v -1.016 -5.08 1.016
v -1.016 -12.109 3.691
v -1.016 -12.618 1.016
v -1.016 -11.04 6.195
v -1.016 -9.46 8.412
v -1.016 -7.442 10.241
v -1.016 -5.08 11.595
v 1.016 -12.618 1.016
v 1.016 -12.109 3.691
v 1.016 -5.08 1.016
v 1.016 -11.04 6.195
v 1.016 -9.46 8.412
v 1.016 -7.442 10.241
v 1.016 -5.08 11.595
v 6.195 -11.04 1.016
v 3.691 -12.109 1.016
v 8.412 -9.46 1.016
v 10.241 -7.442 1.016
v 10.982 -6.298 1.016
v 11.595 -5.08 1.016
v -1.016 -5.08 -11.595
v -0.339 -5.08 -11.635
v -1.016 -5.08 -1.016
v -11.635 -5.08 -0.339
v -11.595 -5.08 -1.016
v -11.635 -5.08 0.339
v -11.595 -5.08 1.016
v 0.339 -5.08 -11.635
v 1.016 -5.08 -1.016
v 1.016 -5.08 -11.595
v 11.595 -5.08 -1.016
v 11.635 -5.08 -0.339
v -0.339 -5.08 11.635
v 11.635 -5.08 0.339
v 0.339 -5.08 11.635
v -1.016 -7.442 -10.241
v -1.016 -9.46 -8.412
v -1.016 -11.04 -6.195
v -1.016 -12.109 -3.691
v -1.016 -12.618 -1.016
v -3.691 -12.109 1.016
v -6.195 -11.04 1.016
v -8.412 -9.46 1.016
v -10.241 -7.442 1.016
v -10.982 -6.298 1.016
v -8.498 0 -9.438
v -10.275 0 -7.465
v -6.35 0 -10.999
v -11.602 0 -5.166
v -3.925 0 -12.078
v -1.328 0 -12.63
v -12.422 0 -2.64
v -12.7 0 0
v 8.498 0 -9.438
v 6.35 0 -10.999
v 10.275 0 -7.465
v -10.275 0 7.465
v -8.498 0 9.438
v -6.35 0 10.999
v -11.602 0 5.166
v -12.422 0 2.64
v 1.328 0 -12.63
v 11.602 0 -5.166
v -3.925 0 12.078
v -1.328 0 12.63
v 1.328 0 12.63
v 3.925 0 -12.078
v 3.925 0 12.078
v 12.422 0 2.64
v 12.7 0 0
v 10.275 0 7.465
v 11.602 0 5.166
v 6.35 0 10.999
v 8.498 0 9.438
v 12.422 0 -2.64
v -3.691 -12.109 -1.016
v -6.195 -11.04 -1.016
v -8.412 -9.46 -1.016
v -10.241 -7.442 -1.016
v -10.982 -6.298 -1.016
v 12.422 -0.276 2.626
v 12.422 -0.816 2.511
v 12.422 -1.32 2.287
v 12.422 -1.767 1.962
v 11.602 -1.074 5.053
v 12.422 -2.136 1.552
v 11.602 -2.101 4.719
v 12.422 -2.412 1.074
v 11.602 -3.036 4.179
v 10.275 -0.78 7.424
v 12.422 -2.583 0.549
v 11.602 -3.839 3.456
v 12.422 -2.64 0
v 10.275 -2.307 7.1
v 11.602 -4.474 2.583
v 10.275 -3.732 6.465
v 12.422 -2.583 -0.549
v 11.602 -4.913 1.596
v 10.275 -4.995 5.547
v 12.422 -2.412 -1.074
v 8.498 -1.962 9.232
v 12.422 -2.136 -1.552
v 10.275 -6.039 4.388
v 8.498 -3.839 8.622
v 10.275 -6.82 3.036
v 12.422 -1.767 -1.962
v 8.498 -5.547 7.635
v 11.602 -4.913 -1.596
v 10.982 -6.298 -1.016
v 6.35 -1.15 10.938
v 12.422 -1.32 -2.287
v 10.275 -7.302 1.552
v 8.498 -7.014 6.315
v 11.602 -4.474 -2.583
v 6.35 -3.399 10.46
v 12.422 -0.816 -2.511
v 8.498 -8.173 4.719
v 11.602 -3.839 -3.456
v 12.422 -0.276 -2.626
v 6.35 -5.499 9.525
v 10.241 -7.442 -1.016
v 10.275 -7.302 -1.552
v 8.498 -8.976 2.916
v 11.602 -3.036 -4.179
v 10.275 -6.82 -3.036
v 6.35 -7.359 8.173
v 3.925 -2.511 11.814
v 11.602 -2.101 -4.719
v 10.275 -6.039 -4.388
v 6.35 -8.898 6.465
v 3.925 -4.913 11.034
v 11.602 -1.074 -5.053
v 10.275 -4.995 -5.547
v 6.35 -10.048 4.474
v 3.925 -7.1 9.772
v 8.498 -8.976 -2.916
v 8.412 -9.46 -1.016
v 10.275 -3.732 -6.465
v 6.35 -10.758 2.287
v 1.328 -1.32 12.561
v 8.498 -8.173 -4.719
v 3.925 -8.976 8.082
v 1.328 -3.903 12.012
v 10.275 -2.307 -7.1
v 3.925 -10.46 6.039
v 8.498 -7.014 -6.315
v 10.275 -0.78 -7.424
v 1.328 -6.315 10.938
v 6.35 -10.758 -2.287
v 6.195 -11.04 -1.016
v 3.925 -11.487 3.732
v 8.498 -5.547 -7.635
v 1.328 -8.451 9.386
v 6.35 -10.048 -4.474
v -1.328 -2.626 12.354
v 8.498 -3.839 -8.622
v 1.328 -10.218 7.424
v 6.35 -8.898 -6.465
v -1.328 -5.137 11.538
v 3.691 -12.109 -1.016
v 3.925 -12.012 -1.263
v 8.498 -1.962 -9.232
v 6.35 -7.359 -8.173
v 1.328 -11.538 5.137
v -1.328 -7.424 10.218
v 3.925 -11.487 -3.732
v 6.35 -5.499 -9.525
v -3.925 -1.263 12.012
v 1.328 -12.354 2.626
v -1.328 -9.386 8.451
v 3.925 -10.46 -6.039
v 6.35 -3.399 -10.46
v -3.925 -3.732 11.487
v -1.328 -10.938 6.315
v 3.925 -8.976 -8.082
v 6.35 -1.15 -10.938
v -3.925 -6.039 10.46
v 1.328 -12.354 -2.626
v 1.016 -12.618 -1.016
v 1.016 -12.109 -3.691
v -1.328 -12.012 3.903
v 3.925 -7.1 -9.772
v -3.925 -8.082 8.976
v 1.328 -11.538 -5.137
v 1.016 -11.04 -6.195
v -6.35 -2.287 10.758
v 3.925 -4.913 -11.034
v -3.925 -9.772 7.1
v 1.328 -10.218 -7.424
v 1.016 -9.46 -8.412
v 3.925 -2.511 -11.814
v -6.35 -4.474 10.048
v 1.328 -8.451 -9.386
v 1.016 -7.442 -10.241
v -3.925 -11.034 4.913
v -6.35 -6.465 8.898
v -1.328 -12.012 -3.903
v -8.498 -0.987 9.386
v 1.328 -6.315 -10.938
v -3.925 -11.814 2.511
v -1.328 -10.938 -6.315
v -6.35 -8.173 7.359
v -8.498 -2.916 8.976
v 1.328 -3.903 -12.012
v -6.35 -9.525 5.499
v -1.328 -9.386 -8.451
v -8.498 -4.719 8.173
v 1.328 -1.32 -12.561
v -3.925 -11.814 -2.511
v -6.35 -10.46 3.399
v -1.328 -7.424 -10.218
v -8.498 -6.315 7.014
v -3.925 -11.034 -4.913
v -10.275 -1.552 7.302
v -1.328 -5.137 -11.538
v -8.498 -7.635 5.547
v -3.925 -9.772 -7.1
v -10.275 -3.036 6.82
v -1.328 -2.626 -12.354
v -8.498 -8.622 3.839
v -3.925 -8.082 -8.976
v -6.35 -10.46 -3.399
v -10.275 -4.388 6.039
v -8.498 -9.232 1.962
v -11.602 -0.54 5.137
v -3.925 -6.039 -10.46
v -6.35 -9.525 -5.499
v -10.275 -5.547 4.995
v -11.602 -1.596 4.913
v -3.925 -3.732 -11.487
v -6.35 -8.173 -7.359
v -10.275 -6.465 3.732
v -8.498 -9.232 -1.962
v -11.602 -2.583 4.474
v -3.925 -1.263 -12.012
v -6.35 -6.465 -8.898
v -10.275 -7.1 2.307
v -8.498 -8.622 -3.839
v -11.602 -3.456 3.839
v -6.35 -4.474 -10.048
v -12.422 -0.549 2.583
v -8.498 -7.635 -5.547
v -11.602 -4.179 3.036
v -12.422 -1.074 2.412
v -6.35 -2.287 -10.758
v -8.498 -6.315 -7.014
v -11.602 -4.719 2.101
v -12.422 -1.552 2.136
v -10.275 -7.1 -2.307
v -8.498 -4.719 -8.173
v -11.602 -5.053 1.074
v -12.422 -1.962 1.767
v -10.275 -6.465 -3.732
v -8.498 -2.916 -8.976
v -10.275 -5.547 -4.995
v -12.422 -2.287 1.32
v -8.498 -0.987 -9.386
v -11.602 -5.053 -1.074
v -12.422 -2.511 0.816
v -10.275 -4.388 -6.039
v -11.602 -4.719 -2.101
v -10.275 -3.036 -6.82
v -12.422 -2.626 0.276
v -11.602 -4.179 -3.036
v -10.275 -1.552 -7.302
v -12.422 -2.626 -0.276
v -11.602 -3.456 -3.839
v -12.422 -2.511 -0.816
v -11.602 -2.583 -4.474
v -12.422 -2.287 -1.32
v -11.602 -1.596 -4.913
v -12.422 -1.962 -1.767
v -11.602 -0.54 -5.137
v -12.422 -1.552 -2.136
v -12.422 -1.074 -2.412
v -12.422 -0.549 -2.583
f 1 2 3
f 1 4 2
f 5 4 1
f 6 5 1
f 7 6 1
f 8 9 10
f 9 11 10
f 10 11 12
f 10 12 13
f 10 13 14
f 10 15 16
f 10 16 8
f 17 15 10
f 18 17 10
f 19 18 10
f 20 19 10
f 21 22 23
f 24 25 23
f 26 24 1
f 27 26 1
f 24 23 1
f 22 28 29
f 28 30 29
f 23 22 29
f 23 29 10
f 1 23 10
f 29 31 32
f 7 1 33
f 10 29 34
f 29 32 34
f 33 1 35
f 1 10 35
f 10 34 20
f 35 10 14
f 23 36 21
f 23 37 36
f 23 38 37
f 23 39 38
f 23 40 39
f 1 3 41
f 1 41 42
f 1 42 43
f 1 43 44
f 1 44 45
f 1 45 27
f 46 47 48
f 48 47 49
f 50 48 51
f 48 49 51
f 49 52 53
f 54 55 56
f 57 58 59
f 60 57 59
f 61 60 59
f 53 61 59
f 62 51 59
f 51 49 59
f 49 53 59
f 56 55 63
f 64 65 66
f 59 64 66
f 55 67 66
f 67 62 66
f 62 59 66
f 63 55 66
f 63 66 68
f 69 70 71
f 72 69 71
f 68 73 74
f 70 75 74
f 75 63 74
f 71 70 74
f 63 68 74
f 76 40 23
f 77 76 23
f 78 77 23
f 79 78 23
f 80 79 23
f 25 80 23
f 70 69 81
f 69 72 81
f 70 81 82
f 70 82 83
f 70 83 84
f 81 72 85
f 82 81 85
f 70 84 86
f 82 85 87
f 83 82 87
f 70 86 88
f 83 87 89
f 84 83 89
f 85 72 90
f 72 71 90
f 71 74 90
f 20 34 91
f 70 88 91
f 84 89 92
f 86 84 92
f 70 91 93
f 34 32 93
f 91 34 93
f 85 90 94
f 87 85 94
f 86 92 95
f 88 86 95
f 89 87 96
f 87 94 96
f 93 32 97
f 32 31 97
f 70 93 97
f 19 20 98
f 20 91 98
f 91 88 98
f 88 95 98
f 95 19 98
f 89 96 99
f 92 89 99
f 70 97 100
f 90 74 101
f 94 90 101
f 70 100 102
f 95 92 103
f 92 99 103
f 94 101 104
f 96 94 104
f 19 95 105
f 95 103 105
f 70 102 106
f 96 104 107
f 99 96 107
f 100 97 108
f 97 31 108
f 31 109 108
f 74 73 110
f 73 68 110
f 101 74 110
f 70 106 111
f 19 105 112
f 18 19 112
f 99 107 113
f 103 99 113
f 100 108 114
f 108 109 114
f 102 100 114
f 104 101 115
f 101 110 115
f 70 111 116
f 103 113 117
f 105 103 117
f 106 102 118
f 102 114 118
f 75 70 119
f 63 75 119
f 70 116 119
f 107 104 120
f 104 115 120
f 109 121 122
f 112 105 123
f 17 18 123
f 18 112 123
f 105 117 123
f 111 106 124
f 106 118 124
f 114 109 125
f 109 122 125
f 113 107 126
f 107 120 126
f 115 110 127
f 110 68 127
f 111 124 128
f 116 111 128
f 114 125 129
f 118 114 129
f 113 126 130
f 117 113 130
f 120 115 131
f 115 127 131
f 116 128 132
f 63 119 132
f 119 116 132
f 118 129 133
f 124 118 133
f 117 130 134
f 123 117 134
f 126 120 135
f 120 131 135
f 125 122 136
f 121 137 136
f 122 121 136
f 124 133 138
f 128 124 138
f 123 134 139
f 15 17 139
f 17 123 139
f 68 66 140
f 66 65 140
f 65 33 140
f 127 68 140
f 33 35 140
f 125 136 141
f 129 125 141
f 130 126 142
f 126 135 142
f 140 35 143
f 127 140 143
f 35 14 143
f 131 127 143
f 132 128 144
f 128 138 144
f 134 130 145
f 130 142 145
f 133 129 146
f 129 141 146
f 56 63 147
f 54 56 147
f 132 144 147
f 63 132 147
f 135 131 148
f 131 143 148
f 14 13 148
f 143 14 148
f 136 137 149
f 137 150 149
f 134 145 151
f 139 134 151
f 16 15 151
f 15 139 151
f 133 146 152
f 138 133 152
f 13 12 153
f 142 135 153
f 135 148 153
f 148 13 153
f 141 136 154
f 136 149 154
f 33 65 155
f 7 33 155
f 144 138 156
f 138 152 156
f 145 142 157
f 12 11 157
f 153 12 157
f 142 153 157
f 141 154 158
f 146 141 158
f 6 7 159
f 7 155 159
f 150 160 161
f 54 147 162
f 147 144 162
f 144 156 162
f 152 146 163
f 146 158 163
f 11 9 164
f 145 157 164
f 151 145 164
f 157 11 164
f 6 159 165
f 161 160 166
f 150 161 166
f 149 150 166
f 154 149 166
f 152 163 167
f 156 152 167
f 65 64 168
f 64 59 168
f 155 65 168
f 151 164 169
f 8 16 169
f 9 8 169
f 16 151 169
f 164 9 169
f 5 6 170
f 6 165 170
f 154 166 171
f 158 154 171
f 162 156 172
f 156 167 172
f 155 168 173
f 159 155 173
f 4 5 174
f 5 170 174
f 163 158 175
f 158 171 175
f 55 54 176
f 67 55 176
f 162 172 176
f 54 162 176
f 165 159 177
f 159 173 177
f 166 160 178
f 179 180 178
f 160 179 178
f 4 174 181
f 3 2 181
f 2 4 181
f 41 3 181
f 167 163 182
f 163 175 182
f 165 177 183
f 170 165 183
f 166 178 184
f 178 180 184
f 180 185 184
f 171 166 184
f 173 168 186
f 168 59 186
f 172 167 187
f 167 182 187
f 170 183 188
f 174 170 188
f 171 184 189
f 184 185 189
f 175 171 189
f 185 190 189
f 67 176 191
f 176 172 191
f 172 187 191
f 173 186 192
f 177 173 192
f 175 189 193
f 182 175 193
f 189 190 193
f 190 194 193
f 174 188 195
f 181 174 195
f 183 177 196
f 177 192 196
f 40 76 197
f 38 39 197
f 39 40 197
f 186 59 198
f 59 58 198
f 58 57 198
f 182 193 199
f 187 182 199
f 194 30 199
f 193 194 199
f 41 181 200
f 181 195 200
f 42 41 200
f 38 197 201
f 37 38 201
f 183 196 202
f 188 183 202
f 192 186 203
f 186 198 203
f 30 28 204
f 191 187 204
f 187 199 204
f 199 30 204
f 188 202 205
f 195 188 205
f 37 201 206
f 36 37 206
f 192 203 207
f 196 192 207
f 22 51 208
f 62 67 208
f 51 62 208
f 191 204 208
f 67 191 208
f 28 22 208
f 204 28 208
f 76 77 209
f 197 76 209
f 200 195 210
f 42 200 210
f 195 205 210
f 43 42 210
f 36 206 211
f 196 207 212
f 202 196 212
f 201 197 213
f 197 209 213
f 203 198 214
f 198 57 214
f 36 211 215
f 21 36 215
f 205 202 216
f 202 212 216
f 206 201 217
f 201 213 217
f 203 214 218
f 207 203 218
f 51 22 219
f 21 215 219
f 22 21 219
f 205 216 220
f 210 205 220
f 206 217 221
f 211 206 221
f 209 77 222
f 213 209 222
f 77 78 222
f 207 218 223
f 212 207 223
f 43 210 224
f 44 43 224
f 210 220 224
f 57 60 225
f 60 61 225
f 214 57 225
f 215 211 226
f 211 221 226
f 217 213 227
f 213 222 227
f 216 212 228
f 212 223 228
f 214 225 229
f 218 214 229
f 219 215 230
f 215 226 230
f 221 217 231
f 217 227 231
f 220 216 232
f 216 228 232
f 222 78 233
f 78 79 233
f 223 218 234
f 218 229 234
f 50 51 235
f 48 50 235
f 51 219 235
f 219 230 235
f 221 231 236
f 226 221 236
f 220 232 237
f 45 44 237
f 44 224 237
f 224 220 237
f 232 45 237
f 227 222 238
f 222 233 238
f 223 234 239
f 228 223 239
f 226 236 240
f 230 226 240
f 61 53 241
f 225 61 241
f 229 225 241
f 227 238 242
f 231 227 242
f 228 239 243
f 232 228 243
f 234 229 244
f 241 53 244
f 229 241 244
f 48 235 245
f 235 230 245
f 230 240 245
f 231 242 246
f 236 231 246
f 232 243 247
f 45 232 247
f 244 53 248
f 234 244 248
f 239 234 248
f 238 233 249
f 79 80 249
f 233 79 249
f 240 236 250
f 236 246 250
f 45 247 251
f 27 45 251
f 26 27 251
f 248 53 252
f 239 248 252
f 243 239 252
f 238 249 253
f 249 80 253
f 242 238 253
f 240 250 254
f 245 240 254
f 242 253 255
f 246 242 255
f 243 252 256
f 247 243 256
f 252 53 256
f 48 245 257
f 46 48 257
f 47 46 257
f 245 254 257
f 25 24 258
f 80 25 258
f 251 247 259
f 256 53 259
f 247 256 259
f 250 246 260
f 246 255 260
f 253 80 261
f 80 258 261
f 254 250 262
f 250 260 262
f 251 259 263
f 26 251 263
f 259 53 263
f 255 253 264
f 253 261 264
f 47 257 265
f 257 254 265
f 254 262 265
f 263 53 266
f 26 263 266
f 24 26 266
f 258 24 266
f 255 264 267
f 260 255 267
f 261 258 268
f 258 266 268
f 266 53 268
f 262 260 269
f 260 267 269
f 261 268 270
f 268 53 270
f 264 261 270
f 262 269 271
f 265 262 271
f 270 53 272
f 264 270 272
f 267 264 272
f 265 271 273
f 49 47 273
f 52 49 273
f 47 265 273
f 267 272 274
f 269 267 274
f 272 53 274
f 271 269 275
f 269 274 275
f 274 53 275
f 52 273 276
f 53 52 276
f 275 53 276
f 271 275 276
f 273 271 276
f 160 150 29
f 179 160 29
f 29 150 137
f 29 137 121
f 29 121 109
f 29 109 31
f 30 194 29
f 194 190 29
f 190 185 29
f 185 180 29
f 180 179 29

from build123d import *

# Parameters (mm, degrees)
F1_ANGLE = 180
F2_W     = 25.4
F2_H     = 2.032
F3_DEPTH = 12.7
F4_W     = 2.032
F4_H     = 25.4
F5_DEPTH = 12.7


with BuildPart() as f1:
    # F0 (on Front) → F1 (revolve)
    with BuildSketch(Plane.XZ):
        with BuildLine():
            ThreePointArc((12.7, 0), (0, 12.7), (-12.7, 0))
            Line((-12.7, 0), (12.7, 0))
        make_face()
    revolve(axis=Axis((0, 0, 0), (1, 0, 0)), revolution_arc=F1_ANGLE)

    # F2 (on Right) → F3 (cut, symmetric)
    with BuildSketch(Plane.YZ):
        with Locations((-17.78, 0)):
            Rectangle(F2_W, F2_H)
    extrude(amount=F3_DEPTH, both=True, mode=Mode.SUBTRACT)

    # F4 (on Top) → F5 (cut, symmetric)
    with BuildSketch(Plane.XY):
        with Locations((0, -17.78)):
            Rectangle(F4_W, F4_H)
    extrude(amount=F5_DEPTH, both=True, mode=Mode.SUBTRACT)


solid = f1.part
